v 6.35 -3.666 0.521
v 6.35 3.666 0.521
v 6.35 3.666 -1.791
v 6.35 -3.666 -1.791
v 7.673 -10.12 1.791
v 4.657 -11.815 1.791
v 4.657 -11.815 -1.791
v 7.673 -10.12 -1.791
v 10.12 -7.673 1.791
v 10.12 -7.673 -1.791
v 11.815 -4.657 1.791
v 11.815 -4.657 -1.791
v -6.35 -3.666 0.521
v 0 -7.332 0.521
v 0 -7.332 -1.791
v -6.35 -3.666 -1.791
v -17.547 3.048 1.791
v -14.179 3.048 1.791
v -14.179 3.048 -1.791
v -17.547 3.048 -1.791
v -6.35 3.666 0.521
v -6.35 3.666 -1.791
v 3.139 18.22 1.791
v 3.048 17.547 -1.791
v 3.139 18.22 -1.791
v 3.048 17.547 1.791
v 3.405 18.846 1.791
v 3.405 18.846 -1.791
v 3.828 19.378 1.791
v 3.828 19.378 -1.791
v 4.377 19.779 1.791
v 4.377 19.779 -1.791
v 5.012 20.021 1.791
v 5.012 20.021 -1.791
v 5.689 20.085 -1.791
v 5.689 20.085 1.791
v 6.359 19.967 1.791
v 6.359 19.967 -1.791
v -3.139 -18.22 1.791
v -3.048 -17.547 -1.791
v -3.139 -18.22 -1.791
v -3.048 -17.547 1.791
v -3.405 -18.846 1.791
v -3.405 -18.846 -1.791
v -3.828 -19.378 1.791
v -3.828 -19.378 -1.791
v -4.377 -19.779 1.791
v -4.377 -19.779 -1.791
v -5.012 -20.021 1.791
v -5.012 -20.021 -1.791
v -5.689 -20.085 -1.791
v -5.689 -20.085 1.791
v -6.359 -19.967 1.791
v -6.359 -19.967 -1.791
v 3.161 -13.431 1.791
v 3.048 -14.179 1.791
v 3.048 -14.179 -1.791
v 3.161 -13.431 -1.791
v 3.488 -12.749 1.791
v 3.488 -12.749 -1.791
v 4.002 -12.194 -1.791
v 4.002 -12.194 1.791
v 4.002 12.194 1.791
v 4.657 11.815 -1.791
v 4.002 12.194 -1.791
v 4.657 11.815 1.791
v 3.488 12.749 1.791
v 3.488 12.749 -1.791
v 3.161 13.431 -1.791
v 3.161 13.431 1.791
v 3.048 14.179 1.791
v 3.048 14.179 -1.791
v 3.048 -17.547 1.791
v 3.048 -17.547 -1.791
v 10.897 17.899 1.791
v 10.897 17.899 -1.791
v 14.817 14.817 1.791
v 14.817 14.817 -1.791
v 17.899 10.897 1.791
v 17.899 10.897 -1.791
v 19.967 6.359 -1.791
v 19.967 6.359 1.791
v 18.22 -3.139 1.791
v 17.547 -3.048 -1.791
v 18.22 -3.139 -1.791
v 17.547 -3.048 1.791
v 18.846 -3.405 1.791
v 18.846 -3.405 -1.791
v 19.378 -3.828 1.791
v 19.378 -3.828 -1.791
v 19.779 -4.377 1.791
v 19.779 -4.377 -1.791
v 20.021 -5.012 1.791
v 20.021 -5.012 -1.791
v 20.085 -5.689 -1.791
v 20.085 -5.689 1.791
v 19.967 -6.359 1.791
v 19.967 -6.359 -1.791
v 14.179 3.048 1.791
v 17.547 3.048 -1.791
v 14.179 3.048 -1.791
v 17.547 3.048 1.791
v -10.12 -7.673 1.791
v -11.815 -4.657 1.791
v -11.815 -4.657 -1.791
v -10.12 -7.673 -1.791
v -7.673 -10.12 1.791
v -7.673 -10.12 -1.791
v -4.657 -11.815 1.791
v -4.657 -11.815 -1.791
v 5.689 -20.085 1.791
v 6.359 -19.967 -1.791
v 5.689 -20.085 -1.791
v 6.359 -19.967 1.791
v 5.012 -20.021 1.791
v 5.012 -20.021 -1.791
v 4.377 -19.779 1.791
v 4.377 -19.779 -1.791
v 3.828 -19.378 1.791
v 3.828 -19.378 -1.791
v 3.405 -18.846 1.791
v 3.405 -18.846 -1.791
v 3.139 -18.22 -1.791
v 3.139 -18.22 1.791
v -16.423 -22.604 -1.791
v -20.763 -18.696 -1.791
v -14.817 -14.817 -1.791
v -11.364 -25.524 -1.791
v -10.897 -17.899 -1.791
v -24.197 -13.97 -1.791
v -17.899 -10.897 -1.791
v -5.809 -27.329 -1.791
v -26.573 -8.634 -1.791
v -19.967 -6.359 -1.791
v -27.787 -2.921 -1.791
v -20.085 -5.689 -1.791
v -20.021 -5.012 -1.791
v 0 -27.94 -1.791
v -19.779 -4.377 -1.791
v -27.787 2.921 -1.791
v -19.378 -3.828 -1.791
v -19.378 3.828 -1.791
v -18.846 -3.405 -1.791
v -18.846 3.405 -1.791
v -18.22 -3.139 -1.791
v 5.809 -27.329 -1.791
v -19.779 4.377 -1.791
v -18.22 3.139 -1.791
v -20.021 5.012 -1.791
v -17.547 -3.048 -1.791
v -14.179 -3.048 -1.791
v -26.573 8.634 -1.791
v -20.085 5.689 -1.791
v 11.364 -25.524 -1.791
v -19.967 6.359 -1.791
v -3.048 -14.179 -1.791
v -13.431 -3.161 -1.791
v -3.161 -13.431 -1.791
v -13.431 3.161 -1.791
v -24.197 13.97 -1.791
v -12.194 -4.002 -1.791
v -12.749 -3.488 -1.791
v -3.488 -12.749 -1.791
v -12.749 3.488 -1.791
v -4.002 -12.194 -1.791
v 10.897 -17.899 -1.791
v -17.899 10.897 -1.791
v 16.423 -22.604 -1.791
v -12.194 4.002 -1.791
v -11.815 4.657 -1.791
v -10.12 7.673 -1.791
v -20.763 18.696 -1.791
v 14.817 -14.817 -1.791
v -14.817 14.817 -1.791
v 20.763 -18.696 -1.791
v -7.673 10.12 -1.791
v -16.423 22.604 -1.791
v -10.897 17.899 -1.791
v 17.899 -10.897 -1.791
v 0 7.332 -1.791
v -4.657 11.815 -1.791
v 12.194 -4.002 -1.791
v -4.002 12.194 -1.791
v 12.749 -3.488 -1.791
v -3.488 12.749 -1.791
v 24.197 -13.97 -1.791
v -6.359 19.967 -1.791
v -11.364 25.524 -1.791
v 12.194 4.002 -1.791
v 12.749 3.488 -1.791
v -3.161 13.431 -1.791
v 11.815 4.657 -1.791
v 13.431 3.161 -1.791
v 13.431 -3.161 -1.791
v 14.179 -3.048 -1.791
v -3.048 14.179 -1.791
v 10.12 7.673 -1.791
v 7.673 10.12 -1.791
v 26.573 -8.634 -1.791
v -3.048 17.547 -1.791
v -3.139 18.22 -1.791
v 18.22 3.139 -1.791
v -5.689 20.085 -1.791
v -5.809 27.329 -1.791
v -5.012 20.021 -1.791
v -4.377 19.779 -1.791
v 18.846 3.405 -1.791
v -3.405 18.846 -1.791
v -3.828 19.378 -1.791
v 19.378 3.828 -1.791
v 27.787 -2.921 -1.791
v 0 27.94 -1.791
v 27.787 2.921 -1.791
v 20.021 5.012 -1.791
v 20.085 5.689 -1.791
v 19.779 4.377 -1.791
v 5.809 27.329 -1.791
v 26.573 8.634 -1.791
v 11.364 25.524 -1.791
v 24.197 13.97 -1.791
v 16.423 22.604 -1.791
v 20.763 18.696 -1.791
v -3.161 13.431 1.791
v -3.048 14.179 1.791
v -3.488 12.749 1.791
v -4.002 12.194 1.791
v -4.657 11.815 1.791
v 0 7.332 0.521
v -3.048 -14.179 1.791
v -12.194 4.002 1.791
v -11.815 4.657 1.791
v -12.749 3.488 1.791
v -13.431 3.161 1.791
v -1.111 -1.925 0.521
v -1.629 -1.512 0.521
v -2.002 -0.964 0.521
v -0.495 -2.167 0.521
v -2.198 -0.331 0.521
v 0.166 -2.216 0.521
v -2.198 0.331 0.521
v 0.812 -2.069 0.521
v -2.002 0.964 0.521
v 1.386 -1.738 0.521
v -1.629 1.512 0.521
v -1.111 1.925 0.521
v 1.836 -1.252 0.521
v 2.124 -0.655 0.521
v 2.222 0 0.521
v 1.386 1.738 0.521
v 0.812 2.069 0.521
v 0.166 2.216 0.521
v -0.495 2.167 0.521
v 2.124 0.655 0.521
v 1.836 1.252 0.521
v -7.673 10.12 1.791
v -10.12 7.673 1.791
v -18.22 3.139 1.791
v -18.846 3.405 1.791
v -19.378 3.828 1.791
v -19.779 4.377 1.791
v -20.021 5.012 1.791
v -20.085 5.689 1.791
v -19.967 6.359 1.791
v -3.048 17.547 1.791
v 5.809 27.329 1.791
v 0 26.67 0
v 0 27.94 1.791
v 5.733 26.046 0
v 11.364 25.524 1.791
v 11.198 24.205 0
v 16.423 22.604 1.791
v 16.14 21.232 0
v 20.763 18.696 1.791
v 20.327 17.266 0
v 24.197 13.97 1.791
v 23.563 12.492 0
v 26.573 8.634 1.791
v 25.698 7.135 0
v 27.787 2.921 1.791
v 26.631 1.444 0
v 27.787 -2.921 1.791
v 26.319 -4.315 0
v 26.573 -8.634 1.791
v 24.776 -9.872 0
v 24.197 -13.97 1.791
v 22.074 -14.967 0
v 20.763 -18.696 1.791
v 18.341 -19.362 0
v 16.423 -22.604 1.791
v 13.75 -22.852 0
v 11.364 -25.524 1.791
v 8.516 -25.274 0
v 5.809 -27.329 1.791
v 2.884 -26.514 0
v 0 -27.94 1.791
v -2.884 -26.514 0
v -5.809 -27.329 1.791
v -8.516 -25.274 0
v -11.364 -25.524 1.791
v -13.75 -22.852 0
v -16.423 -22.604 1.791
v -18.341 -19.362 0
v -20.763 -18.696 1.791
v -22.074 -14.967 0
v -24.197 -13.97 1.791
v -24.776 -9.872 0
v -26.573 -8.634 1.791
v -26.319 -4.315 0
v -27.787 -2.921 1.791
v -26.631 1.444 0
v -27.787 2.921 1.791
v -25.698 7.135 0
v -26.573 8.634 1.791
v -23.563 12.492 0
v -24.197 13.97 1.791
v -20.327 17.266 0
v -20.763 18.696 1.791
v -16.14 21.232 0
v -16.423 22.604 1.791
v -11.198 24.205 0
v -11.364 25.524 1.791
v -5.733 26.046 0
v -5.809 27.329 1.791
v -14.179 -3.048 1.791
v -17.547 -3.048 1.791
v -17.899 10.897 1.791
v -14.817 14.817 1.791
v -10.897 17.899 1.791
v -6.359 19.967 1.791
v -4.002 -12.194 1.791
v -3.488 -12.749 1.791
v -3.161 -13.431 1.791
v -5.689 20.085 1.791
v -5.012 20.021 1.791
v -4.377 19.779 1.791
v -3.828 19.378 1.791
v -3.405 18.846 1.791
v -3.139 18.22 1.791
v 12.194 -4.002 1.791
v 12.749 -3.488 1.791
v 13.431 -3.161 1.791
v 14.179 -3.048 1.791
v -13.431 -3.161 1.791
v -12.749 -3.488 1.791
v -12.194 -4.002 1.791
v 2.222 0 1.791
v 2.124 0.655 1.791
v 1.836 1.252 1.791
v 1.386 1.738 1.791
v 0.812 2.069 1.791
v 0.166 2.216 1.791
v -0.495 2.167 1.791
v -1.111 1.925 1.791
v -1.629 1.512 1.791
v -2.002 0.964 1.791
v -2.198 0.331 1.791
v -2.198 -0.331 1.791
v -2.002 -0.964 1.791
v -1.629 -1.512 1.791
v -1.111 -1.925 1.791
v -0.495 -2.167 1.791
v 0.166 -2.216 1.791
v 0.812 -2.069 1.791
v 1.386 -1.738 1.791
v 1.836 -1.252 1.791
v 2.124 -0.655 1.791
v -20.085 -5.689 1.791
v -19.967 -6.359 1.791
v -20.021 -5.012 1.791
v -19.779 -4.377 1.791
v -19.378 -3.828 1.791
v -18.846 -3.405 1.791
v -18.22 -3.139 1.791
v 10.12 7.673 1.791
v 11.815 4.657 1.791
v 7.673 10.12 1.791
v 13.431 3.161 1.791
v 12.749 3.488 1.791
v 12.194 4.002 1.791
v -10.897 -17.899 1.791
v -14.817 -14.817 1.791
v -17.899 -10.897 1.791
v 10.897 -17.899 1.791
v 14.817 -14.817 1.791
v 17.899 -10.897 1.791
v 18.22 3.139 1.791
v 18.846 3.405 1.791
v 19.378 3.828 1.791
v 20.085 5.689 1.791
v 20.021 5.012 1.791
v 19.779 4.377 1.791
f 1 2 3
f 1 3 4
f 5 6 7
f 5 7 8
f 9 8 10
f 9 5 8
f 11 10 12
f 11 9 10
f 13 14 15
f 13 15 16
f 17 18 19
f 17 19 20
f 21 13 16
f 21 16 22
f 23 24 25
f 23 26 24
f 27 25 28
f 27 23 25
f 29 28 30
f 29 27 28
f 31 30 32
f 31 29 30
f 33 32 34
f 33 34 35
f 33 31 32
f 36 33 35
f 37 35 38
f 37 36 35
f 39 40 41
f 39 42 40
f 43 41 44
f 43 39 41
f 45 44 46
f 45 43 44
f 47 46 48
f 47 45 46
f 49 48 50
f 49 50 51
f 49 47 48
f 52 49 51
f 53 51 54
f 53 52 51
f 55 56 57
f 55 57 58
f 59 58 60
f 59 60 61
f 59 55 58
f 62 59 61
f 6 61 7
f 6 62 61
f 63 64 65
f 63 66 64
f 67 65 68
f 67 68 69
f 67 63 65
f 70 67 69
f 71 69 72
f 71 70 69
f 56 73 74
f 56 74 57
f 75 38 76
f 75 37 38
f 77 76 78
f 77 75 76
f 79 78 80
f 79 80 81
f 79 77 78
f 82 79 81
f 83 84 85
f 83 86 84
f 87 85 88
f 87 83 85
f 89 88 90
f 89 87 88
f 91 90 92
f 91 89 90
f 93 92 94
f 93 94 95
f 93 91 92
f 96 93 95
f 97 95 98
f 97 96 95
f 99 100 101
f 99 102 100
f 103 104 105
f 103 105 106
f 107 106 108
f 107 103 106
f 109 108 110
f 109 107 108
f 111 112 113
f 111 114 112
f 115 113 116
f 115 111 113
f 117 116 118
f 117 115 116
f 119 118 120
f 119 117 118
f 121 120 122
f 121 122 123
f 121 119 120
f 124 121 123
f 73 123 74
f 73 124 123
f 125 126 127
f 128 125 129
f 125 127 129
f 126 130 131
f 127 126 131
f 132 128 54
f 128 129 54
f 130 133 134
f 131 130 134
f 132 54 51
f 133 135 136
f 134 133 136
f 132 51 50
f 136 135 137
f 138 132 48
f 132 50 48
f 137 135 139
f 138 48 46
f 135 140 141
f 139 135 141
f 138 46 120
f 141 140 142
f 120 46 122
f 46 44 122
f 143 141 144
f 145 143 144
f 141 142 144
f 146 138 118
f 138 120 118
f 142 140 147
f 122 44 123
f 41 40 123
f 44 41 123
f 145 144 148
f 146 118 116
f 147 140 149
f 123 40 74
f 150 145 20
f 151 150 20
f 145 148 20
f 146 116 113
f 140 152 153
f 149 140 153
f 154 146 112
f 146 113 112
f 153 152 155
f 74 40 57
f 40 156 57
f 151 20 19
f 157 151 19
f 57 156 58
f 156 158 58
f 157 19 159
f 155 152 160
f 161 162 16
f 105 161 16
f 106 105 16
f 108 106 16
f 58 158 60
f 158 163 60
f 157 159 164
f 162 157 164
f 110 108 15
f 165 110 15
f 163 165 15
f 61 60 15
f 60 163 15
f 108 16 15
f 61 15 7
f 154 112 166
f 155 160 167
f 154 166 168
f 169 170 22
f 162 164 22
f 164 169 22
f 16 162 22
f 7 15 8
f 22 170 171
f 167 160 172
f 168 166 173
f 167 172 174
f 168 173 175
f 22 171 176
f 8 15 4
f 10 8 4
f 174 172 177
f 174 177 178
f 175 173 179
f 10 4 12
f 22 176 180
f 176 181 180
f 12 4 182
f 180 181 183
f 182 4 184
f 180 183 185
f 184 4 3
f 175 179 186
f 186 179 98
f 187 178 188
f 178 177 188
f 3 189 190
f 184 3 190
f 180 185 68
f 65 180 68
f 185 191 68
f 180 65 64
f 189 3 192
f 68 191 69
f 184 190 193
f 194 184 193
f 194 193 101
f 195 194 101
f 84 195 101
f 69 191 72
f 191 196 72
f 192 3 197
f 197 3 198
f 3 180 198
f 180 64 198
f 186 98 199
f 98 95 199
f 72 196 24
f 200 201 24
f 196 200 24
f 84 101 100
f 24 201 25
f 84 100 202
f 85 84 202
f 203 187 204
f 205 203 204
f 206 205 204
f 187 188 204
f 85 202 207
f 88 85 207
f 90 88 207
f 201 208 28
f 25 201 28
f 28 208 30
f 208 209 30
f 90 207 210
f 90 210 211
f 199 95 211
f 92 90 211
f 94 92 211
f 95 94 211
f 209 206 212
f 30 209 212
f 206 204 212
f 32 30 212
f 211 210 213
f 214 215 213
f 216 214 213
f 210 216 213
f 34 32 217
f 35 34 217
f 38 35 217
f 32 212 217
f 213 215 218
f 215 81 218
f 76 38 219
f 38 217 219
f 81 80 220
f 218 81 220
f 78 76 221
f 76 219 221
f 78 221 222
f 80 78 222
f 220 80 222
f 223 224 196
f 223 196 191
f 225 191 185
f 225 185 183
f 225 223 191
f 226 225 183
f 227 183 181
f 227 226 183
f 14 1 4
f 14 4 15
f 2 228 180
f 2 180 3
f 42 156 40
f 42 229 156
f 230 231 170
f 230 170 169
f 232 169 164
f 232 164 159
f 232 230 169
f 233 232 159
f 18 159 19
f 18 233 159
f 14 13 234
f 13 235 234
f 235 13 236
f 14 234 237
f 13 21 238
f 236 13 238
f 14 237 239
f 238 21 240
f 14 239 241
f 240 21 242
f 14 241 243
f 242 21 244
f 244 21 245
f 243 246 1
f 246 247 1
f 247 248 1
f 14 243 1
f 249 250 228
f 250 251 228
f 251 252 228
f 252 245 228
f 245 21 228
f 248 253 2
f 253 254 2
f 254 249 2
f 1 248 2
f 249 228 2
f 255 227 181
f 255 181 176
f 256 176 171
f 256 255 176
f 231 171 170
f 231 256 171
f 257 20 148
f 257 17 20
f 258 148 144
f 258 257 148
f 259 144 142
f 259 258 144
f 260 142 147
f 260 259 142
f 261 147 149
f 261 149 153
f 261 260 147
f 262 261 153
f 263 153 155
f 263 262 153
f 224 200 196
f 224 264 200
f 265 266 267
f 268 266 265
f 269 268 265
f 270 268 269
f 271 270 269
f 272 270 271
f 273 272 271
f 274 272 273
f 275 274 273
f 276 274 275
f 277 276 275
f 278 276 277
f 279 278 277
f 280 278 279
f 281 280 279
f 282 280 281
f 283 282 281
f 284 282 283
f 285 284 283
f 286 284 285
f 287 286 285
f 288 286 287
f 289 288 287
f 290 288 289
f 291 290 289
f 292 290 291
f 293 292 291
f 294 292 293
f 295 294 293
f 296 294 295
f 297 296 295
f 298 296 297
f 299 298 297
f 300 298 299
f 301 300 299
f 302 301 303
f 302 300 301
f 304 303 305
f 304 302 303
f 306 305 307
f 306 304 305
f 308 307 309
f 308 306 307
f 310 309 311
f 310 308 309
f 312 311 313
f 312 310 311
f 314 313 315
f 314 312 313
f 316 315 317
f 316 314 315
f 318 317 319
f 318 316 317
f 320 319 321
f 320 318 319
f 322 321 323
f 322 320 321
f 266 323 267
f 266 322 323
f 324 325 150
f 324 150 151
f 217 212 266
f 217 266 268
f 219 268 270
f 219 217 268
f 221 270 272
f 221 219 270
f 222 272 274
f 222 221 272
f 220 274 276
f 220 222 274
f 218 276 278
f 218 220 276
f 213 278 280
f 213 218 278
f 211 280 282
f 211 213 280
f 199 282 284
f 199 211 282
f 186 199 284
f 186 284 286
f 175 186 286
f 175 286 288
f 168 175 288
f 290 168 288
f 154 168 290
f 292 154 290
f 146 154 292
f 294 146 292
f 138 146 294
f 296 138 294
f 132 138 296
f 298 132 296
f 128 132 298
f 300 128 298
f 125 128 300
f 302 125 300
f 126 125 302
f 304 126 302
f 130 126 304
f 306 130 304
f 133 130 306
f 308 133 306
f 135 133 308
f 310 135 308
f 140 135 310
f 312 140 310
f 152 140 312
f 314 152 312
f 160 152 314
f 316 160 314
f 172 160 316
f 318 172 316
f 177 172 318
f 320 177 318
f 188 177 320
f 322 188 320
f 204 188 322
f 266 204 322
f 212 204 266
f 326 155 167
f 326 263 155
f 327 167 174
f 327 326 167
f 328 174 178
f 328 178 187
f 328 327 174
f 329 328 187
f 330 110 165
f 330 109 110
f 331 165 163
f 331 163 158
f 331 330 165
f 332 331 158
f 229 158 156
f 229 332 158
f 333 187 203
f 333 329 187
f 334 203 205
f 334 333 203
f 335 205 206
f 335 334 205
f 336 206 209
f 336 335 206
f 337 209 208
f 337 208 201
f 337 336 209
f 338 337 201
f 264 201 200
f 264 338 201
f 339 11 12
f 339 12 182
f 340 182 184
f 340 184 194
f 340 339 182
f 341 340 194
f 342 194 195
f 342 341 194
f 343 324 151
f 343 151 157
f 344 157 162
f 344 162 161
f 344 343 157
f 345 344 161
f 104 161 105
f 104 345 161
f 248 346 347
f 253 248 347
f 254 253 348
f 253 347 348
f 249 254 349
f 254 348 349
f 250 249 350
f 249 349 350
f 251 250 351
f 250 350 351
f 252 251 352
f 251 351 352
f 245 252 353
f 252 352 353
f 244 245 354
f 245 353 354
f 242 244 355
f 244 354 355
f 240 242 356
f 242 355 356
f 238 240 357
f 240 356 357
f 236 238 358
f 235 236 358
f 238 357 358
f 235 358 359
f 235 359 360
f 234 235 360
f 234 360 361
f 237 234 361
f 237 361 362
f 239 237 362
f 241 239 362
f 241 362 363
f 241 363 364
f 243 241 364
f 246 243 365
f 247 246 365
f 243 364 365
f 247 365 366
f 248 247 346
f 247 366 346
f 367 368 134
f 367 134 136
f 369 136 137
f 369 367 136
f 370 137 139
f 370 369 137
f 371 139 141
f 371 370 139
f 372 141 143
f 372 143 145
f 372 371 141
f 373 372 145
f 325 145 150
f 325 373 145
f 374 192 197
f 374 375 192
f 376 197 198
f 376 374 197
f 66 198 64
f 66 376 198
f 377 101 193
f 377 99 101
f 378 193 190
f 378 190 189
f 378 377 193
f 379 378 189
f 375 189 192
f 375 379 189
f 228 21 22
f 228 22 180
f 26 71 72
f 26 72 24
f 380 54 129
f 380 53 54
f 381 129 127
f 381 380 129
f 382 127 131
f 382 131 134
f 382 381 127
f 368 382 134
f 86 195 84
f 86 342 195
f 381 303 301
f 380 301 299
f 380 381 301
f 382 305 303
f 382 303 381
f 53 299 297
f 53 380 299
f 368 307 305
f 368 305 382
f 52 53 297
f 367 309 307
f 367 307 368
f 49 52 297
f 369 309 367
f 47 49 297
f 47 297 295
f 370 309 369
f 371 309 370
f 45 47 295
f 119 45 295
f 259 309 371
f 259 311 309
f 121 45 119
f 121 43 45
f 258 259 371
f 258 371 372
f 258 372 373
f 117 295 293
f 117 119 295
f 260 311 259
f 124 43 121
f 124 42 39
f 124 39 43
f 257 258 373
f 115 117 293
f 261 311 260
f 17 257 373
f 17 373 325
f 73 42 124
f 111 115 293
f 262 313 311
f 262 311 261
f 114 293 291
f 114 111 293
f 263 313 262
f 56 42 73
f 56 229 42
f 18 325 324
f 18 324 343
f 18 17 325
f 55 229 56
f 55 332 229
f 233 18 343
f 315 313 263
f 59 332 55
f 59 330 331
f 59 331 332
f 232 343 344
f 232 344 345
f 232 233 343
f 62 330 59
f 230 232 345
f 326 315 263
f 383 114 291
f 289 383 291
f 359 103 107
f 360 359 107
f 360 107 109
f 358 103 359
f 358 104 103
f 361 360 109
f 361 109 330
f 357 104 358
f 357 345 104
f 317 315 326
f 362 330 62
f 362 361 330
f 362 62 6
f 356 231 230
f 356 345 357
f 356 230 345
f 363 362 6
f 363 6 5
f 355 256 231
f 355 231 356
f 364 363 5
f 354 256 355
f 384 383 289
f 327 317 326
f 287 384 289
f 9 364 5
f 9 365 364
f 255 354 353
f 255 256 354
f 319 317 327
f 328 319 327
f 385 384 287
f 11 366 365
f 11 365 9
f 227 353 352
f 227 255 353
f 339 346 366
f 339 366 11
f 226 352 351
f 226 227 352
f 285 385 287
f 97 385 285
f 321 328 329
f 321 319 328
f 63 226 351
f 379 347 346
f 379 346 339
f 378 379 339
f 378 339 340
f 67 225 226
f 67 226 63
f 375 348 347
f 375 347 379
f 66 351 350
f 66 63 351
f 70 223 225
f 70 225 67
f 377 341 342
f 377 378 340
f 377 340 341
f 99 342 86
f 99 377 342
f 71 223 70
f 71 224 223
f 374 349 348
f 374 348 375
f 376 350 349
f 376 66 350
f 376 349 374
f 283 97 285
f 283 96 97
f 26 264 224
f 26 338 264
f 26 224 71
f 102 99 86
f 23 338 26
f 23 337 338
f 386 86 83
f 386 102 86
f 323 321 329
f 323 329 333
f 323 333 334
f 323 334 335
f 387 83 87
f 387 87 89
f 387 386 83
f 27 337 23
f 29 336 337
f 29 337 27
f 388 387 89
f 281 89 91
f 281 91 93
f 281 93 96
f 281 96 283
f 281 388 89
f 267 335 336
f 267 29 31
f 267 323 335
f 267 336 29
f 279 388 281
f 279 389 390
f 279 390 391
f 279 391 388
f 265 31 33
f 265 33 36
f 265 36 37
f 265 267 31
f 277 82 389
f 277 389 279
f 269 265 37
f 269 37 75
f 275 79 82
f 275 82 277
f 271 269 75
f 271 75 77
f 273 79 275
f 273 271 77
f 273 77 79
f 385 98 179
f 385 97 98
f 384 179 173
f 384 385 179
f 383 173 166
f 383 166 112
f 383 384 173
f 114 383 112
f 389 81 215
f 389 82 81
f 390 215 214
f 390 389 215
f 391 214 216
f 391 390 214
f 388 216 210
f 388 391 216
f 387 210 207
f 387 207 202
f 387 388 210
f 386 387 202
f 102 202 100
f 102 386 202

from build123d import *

# Parameters (mm, degrees)
F0_R     = 27.94
F1_DEPTH = 1.7907
F4_R     = 2.2225
F5_DEPTH = 1.27


with BuildPart() as f1:
    # F0 (on Top) → F1 (new body, symmetric)
    with BuildSketch(Plane.XY):
        Circle(F0_R)
        with BuildLine():
            ThreePointArc((-19.966928, -6.358759), (-19.597222, -4.089021), (-17.546694, -3.048))
            Line((-17.546694, -3.048), (-14.17857, -3.048))
            ThreePointArc((-14.17857, -3.048), (-12.749232, -3.488335), (-11.815475, -4.656667))
            ThreePointArc((-11.815475, -4.656667), (-8.980256, -8.980256), (-4.656667, -11.815475))
            ThreePointArc((-4.656667, -11.815475), (-3.488335, -12.749232), (-3.048, -14.17857))
            Line((-3.048, -14.17857), (-3.048, -17.546694))
            ThreePointArc((-3.048, -17.546694), (-4.089021, -19.597222), (-6.358759, -19.966928))
            ThreePointArc((-6.358759, -19.966928), (-14.817423, -14.817423), (-19.966928, -6.358759))
        make_face(mode=Mode.SUBTRACT)
        Polygon((6.35, 3.666174), (6.35, -3.666174), (0, -7.332348), (-6.35, -3.666174), (-6.35, 3.666174), (0, 7.332348), align=None, mode=Mode.SUBTRACT)
        with BuildLine():
            Line((3.048, -17.546694), (3.048, -14.17857))
            ThreePointArc((3.048, -14.17857), (3.488335, -12.749232), (4.656667, -11.815475))
            ThreePointArc((4.656667, -11.815475), (8.980256, -8.980256), (11.815475, -4.656667))
            ThreePointArc((11.815475, -4.656667), (12.749232, -3.488335), (14.17857, -3.048))
            Line((14.17857, -3.048), (17.546694, -3.048))
            ThreePointArc((17.546694, -3.048), (19.597222, -4.089021), (19.966928, -6.358759))
            ThreePointArc((19.966928, -6.358759), (14.817423, -14.817423), (6.358759, -19.966928))
            ThreePointArc((6.358759, -19.966928), (4.089021, -19.597222), (3.048, -17.546694))
        make_face(mode=Mode.SUBTRACT)
        with BuildLine():
            ThreePointArc((-3.048, 14.17857), (-3.488335, 12.749232), (-4.656667, 11.815475))
            ThreePointArc((-4.656667, 11.815475), (-8.980256, 8.980256), (-11.815475, 4.656667))
            ThreePointArc((-11.815475, 4.656667), (-12.749232, 3.488335), (-14.17857, 3.048))
            Line((-14.17857, 3.048), (-17.546694, 3.048))
            ThreePointArc((-17.546694, 3.048), (-19.597222, 4.089021), (-19.966928, 6.358759))
            ThreePointArc((-19.966928, 6.358759), (-14.817423, 14.817423), (-6.358759, 19.966928))
            ThreePointArc((-6.358759, 19.966928), (-4.089021, 19.597222), (-3.048, 17.546694))
            Line((-3.048, 17.546694), (-3.048, 14.17857))
        make_face(mode=Mode.SUBTRACT)
        with BuildLine():
            Line((3.048, 14.17857), (3.048, 17.546694))
            ThreePointArc((3.048, 17.546694), (4.089021, 19.597222), (6.358759, 19.966928))
            ThreePointArc((6.358759, 19.966928), (14.817423, 14.817423), (19.966928, 6.358759))
            ThreePointArc((19.966928, 6.358759), (19.597222, 4.089021), (17.546694, 3.048))
            Line((17.546694, 3.048), (14.17857, 3.048))
            ThreePointArc((14.17857, 3.048), (12.749232, 3.488335), (11.815475, 4.656667))
            ThreePointArc((11.815475, 4.656667), (8.980256, 8.980256), (4.656667, 11.815475))
            ThreePointArc((4.656667, 11.815475), (3.488335, 12.749232), (3.048, 14.17857))
        make_face(mode=Mode.SUBTRACT)
    extrude(amount=F1_DEPTH, both=True)

    # F2 (on Right) → F3 (revolve, cut)
    with BuildSketch(Plane.YZ):
        Polygon((27.94, 1.7907), (26.67, 0), (27.94, -1.7907), align=None)
    revolve(axis=Axis((0, 0, 0.396406), (0, 0, -1)), mode=Mode.SUBTRACT)

    # F4 (on face) → F5 (join)
    with BuildSketch(Plane.XY.offset(1.7907)):
        Polygon((6.35, 3.666174), (0, 7.332348), (-6.35, 3.666174), (-6.35, -3.666174), (0, -7.332348), (6.35, -3.666174), align=None)
        Circle(F4_R, mode=Mode.SUBTRACT)
    extrude(amount=-F5_DEPTH)


solid = f1.part
